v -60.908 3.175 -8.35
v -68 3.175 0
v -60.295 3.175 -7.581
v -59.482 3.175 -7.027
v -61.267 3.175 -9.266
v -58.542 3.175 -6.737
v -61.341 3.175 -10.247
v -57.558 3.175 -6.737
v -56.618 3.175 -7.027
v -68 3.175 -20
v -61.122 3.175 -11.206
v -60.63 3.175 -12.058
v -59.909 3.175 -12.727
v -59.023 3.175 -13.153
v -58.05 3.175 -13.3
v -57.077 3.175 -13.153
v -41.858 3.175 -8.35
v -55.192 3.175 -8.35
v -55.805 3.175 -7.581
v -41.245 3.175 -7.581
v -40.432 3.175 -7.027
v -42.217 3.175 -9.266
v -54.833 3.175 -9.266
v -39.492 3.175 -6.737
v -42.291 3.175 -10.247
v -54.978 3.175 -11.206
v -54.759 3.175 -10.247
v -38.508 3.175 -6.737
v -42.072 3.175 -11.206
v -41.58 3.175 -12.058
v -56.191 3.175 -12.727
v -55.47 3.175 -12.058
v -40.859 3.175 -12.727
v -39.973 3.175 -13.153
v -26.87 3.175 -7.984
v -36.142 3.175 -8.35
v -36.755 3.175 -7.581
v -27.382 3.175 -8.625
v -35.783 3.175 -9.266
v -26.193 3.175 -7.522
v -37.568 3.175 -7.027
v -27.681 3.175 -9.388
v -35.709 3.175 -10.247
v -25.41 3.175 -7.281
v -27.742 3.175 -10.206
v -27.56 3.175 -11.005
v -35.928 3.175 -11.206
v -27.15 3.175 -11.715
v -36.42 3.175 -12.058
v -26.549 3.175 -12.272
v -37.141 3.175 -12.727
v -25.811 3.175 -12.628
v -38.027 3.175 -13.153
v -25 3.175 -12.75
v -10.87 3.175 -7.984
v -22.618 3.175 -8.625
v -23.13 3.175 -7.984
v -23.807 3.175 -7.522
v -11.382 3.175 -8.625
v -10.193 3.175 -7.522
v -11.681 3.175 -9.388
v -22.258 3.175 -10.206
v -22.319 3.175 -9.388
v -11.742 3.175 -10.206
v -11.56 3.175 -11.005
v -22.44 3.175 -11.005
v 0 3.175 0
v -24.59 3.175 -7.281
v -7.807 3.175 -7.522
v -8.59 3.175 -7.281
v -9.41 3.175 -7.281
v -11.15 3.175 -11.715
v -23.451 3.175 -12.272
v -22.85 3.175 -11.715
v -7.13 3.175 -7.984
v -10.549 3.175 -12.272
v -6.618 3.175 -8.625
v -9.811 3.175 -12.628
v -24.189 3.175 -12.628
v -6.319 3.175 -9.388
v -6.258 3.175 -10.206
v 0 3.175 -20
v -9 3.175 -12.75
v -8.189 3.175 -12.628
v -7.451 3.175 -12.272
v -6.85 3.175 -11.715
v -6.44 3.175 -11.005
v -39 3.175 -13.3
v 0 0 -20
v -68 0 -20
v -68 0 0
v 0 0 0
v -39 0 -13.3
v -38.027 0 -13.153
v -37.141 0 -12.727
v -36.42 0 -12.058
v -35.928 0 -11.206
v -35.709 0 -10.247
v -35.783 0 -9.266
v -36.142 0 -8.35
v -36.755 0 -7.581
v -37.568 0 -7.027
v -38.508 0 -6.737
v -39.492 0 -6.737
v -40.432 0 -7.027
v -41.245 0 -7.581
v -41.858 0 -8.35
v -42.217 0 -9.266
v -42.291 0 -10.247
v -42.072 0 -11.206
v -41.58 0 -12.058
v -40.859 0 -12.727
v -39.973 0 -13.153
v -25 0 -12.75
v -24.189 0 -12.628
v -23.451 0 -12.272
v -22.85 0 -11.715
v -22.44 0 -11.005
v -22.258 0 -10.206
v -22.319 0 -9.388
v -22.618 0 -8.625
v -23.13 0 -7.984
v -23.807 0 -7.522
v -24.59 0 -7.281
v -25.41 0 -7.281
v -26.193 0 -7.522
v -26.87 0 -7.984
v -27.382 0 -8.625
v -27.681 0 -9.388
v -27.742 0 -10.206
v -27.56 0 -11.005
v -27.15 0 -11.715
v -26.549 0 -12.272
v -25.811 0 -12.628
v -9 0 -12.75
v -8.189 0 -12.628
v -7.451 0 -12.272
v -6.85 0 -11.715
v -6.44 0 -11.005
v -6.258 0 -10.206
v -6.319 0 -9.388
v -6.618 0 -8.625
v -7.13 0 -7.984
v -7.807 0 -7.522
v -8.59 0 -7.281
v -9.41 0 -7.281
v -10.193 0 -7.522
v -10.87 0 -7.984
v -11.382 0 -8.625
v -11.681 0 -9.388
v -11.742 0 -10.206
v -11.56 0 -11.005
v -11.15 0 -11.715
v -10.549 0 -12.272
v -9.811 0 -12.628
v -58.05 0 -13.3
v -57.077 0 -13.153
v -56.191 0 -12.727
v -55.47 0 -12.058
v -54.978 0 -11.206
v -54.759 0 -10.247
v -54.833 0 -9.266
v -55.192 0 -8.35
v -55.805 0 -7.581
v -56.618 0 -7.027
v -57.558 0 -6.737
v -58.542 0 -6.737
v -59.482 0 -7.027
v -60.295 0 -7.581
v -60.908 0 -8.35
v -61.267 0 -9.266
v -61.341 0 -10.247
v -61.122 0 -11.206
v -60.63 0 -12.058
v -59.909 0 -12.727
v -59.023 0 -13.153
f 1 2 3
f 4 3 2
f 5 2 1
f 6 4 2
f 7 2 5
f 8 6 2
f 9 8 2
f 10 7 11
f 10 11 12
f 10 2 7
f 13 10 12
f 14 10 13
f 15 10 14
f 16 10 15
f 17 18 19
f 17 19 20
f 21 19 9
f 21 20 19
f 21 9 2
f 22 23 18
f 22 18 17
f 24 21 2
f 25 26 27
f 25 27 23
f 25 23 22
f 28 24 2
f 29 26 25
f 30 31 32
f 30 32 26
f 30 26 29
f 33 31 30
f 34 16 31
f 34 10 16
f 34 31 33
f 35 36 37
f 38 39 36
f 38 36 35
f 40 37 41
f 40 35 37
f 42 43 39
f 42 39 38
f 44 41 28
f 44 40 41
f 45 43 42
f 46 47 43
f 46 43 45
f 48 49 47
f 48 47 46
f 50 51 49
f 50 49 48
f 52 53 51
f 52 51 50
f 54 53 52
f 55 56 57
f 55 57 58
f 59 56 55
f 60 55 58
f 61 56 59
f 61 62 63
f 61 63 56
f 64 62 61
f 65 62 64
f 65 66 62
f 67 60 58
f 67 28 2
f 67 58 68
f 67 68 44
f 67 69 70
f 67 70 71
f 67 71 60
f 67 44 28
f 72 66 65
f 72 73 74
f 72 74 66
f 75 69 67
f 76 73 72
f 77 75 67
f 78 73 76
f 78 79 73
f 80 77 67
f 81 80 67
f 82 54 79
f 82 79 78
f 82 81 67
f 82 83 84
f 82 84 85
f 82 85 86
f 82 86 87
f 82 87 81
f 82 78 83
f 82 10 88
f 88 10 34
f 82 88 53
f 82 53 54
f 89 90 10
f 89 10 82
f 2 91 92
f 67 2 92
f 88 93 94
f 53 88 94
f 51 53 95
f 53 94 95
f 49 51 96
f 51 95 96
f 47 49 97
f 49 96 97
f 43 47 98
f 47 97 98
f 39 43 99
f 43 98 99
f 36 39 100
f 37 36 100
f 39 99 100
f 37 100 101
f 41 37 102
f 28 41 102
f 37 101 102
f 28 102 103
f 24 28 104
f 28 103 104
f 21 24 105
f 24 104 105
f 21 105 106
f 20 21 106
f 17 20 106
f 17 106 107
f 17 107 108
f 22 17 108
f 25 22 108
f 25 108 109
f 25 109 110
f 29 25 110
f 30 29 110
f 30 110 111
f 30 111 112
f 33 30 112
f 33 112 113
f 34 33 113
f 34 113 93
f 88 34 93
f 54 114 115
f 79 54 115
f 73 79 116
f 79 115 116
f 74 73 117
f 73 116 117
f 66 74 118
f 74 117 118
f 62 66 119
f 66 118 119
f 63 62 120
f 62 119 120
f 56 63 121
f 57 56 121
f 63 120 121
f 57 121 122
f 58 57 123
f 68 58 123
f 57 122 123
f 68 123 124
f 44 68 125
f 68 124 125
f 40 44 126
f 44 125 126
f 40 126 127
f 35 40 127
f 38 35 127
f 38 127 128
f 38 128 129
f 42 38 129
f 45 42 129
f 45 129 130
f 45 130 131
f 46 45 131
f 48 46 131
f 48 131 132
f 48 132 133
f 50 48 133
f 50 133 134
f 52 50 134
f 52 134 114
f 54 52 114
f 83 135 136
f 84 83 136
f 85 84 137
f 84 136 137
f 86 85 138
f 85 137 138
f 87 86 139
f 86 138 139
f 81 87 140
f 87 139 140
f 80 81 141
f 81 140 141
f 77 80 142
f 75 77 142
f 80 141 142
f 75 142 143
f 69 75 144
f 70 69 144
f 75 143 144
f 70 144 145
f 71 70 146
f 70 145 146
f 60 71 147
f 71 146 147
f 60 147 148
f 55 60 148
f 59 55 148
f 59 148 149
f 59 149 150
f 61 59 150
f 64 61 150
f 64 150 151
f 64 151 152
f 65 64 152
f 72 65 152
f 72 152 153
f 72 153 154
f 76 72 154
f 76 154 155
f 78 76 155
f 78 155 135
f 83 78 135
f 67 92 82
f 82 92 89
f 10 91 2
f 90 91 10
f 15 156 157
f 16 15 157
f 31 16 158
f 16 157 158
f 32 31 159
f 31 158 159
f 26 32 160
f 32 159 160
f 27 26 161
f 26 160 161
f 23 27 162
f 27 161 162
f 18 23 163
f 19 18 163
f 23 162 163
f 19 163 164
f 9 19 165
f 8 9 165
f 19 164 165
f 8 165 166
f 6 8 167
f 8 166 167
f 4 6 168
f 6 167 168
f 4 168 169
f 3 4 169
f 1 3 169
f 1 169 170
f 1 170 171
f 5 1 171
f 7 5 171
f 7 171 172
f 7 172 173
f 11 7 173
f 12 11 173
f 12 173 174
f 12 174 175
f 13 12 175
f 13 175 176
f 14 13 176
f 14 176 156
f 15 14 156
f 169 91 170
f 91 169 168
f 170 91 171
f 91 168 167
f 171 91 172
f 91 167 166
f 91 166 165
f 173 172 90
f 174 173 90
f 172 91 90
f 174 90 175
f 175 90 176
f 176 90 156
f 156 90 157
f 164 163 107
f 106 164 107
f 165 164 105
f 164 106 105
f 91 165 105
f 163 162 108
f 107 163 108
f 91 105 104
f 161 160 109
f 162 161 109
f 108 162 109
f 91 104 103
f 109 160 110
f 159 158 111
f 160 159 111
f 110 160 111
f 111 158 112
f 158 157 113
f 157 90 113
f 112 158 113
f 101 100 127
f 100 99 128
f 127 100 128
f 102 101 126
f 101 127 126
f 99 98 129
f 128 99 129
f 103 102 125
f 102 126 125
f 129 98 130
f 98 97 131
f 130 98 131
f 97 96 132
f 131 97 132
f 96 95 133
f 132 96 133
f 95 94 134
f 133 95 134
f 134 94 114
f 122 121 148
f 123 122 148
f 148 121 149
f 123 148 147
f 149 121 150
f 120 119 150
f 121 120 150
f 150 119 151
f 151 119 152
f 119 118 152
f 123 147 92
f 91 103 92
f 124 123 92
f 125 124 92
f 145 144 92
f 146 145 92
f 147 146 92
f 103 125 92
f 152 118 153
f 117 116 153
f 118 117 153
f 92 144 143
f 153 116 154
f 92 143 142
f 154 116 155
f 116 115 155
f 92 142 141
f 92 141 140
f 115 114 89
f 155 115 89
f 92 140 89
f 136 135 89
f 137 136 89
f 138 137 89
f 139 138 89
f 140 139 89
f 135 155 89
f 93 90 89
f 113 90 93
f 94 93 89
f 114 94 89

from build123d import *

# Parameters (mm, degrees)
SKETCH1_W                = 68
SKETCH1_H                = 20
BOSS_EXTRUDE1_DEPTH      = 3.175
M6_CLEARANCE_HOLE1_D     = 6.6
M6_CLEARANCE_HOLE1_DEPTH = 14
M6_CLEARANCE_HOLE1_TIP   = 1.982840043
M5_CLEARANCE_HOLE1_D     = 5.5
M5_CLEARANCE_HOLE1_DEPTH = 14
M5_CLEARANCE_HOLE1_TIP   = 1.652366702


with BuildPart() as part:
    # Sketch1 → Boss-Extrude1 (new body)
    with BuildSketch(Plane(origin=(0, 0, 0), x_dir=(1, 0, 0), z_dir=(0, 1, 0))):
        with Locations((-34, 10)):
            Rectangle(SKETCH1_W, SKETCH1_H)
    extrude(amount=BOSS_EXTRUDE1_DEPTH)

    # M6 Clearance Hole1
    with Locations(Plane(origin=(-39, 3.175, -10), x_dir=(0, 0, 1), z_dir=(0, 1, 0))):
        with Locations((0, 0), (0, -19.05)):
            Hole(M6_CLEARANCE_HOLE1_D / 2, depth=M6_CLEARANCE_HOLE1_DEPTH)
            with Locations((0, 0, -(M6_CLEARANCE_HOLE1_DEPTH + M6_CLEARANCE_HOLE1_TIP / 2))):  # 118° drill point
                Cone(0, M6_CLEARANCE_HOLE1_D / 2, M6_CLEARANCE_HOLE1_TIP, mode=Mode.SUBTRACT)

    # M5 Clearance Hole1
    with Locations(Plane(origin=(-25, 3.175, -10), x_dir=(0, 0, 1), z_dir=(0, 1, 0))):
        with Locations((0, 0), (0, 16)):
            Hole(M5_CLEARANCE_HOLE1_D / 2, depth=M5_CLEARANCE_HOLE1_DEPTH)
            with Locations((0, 0, -(M5_CLEARANCE_HOLE1_DEPTH + M5_CLEARANCE_HOLE1_TIP / 2))):  # 118° drill point
                Cone(0, M5_CLEARANCE_HOLE1_D / 2, M5_CLEARANCE_HOLE1_TIP, mode=Mode.SUBTRACT)


solid = part.part
